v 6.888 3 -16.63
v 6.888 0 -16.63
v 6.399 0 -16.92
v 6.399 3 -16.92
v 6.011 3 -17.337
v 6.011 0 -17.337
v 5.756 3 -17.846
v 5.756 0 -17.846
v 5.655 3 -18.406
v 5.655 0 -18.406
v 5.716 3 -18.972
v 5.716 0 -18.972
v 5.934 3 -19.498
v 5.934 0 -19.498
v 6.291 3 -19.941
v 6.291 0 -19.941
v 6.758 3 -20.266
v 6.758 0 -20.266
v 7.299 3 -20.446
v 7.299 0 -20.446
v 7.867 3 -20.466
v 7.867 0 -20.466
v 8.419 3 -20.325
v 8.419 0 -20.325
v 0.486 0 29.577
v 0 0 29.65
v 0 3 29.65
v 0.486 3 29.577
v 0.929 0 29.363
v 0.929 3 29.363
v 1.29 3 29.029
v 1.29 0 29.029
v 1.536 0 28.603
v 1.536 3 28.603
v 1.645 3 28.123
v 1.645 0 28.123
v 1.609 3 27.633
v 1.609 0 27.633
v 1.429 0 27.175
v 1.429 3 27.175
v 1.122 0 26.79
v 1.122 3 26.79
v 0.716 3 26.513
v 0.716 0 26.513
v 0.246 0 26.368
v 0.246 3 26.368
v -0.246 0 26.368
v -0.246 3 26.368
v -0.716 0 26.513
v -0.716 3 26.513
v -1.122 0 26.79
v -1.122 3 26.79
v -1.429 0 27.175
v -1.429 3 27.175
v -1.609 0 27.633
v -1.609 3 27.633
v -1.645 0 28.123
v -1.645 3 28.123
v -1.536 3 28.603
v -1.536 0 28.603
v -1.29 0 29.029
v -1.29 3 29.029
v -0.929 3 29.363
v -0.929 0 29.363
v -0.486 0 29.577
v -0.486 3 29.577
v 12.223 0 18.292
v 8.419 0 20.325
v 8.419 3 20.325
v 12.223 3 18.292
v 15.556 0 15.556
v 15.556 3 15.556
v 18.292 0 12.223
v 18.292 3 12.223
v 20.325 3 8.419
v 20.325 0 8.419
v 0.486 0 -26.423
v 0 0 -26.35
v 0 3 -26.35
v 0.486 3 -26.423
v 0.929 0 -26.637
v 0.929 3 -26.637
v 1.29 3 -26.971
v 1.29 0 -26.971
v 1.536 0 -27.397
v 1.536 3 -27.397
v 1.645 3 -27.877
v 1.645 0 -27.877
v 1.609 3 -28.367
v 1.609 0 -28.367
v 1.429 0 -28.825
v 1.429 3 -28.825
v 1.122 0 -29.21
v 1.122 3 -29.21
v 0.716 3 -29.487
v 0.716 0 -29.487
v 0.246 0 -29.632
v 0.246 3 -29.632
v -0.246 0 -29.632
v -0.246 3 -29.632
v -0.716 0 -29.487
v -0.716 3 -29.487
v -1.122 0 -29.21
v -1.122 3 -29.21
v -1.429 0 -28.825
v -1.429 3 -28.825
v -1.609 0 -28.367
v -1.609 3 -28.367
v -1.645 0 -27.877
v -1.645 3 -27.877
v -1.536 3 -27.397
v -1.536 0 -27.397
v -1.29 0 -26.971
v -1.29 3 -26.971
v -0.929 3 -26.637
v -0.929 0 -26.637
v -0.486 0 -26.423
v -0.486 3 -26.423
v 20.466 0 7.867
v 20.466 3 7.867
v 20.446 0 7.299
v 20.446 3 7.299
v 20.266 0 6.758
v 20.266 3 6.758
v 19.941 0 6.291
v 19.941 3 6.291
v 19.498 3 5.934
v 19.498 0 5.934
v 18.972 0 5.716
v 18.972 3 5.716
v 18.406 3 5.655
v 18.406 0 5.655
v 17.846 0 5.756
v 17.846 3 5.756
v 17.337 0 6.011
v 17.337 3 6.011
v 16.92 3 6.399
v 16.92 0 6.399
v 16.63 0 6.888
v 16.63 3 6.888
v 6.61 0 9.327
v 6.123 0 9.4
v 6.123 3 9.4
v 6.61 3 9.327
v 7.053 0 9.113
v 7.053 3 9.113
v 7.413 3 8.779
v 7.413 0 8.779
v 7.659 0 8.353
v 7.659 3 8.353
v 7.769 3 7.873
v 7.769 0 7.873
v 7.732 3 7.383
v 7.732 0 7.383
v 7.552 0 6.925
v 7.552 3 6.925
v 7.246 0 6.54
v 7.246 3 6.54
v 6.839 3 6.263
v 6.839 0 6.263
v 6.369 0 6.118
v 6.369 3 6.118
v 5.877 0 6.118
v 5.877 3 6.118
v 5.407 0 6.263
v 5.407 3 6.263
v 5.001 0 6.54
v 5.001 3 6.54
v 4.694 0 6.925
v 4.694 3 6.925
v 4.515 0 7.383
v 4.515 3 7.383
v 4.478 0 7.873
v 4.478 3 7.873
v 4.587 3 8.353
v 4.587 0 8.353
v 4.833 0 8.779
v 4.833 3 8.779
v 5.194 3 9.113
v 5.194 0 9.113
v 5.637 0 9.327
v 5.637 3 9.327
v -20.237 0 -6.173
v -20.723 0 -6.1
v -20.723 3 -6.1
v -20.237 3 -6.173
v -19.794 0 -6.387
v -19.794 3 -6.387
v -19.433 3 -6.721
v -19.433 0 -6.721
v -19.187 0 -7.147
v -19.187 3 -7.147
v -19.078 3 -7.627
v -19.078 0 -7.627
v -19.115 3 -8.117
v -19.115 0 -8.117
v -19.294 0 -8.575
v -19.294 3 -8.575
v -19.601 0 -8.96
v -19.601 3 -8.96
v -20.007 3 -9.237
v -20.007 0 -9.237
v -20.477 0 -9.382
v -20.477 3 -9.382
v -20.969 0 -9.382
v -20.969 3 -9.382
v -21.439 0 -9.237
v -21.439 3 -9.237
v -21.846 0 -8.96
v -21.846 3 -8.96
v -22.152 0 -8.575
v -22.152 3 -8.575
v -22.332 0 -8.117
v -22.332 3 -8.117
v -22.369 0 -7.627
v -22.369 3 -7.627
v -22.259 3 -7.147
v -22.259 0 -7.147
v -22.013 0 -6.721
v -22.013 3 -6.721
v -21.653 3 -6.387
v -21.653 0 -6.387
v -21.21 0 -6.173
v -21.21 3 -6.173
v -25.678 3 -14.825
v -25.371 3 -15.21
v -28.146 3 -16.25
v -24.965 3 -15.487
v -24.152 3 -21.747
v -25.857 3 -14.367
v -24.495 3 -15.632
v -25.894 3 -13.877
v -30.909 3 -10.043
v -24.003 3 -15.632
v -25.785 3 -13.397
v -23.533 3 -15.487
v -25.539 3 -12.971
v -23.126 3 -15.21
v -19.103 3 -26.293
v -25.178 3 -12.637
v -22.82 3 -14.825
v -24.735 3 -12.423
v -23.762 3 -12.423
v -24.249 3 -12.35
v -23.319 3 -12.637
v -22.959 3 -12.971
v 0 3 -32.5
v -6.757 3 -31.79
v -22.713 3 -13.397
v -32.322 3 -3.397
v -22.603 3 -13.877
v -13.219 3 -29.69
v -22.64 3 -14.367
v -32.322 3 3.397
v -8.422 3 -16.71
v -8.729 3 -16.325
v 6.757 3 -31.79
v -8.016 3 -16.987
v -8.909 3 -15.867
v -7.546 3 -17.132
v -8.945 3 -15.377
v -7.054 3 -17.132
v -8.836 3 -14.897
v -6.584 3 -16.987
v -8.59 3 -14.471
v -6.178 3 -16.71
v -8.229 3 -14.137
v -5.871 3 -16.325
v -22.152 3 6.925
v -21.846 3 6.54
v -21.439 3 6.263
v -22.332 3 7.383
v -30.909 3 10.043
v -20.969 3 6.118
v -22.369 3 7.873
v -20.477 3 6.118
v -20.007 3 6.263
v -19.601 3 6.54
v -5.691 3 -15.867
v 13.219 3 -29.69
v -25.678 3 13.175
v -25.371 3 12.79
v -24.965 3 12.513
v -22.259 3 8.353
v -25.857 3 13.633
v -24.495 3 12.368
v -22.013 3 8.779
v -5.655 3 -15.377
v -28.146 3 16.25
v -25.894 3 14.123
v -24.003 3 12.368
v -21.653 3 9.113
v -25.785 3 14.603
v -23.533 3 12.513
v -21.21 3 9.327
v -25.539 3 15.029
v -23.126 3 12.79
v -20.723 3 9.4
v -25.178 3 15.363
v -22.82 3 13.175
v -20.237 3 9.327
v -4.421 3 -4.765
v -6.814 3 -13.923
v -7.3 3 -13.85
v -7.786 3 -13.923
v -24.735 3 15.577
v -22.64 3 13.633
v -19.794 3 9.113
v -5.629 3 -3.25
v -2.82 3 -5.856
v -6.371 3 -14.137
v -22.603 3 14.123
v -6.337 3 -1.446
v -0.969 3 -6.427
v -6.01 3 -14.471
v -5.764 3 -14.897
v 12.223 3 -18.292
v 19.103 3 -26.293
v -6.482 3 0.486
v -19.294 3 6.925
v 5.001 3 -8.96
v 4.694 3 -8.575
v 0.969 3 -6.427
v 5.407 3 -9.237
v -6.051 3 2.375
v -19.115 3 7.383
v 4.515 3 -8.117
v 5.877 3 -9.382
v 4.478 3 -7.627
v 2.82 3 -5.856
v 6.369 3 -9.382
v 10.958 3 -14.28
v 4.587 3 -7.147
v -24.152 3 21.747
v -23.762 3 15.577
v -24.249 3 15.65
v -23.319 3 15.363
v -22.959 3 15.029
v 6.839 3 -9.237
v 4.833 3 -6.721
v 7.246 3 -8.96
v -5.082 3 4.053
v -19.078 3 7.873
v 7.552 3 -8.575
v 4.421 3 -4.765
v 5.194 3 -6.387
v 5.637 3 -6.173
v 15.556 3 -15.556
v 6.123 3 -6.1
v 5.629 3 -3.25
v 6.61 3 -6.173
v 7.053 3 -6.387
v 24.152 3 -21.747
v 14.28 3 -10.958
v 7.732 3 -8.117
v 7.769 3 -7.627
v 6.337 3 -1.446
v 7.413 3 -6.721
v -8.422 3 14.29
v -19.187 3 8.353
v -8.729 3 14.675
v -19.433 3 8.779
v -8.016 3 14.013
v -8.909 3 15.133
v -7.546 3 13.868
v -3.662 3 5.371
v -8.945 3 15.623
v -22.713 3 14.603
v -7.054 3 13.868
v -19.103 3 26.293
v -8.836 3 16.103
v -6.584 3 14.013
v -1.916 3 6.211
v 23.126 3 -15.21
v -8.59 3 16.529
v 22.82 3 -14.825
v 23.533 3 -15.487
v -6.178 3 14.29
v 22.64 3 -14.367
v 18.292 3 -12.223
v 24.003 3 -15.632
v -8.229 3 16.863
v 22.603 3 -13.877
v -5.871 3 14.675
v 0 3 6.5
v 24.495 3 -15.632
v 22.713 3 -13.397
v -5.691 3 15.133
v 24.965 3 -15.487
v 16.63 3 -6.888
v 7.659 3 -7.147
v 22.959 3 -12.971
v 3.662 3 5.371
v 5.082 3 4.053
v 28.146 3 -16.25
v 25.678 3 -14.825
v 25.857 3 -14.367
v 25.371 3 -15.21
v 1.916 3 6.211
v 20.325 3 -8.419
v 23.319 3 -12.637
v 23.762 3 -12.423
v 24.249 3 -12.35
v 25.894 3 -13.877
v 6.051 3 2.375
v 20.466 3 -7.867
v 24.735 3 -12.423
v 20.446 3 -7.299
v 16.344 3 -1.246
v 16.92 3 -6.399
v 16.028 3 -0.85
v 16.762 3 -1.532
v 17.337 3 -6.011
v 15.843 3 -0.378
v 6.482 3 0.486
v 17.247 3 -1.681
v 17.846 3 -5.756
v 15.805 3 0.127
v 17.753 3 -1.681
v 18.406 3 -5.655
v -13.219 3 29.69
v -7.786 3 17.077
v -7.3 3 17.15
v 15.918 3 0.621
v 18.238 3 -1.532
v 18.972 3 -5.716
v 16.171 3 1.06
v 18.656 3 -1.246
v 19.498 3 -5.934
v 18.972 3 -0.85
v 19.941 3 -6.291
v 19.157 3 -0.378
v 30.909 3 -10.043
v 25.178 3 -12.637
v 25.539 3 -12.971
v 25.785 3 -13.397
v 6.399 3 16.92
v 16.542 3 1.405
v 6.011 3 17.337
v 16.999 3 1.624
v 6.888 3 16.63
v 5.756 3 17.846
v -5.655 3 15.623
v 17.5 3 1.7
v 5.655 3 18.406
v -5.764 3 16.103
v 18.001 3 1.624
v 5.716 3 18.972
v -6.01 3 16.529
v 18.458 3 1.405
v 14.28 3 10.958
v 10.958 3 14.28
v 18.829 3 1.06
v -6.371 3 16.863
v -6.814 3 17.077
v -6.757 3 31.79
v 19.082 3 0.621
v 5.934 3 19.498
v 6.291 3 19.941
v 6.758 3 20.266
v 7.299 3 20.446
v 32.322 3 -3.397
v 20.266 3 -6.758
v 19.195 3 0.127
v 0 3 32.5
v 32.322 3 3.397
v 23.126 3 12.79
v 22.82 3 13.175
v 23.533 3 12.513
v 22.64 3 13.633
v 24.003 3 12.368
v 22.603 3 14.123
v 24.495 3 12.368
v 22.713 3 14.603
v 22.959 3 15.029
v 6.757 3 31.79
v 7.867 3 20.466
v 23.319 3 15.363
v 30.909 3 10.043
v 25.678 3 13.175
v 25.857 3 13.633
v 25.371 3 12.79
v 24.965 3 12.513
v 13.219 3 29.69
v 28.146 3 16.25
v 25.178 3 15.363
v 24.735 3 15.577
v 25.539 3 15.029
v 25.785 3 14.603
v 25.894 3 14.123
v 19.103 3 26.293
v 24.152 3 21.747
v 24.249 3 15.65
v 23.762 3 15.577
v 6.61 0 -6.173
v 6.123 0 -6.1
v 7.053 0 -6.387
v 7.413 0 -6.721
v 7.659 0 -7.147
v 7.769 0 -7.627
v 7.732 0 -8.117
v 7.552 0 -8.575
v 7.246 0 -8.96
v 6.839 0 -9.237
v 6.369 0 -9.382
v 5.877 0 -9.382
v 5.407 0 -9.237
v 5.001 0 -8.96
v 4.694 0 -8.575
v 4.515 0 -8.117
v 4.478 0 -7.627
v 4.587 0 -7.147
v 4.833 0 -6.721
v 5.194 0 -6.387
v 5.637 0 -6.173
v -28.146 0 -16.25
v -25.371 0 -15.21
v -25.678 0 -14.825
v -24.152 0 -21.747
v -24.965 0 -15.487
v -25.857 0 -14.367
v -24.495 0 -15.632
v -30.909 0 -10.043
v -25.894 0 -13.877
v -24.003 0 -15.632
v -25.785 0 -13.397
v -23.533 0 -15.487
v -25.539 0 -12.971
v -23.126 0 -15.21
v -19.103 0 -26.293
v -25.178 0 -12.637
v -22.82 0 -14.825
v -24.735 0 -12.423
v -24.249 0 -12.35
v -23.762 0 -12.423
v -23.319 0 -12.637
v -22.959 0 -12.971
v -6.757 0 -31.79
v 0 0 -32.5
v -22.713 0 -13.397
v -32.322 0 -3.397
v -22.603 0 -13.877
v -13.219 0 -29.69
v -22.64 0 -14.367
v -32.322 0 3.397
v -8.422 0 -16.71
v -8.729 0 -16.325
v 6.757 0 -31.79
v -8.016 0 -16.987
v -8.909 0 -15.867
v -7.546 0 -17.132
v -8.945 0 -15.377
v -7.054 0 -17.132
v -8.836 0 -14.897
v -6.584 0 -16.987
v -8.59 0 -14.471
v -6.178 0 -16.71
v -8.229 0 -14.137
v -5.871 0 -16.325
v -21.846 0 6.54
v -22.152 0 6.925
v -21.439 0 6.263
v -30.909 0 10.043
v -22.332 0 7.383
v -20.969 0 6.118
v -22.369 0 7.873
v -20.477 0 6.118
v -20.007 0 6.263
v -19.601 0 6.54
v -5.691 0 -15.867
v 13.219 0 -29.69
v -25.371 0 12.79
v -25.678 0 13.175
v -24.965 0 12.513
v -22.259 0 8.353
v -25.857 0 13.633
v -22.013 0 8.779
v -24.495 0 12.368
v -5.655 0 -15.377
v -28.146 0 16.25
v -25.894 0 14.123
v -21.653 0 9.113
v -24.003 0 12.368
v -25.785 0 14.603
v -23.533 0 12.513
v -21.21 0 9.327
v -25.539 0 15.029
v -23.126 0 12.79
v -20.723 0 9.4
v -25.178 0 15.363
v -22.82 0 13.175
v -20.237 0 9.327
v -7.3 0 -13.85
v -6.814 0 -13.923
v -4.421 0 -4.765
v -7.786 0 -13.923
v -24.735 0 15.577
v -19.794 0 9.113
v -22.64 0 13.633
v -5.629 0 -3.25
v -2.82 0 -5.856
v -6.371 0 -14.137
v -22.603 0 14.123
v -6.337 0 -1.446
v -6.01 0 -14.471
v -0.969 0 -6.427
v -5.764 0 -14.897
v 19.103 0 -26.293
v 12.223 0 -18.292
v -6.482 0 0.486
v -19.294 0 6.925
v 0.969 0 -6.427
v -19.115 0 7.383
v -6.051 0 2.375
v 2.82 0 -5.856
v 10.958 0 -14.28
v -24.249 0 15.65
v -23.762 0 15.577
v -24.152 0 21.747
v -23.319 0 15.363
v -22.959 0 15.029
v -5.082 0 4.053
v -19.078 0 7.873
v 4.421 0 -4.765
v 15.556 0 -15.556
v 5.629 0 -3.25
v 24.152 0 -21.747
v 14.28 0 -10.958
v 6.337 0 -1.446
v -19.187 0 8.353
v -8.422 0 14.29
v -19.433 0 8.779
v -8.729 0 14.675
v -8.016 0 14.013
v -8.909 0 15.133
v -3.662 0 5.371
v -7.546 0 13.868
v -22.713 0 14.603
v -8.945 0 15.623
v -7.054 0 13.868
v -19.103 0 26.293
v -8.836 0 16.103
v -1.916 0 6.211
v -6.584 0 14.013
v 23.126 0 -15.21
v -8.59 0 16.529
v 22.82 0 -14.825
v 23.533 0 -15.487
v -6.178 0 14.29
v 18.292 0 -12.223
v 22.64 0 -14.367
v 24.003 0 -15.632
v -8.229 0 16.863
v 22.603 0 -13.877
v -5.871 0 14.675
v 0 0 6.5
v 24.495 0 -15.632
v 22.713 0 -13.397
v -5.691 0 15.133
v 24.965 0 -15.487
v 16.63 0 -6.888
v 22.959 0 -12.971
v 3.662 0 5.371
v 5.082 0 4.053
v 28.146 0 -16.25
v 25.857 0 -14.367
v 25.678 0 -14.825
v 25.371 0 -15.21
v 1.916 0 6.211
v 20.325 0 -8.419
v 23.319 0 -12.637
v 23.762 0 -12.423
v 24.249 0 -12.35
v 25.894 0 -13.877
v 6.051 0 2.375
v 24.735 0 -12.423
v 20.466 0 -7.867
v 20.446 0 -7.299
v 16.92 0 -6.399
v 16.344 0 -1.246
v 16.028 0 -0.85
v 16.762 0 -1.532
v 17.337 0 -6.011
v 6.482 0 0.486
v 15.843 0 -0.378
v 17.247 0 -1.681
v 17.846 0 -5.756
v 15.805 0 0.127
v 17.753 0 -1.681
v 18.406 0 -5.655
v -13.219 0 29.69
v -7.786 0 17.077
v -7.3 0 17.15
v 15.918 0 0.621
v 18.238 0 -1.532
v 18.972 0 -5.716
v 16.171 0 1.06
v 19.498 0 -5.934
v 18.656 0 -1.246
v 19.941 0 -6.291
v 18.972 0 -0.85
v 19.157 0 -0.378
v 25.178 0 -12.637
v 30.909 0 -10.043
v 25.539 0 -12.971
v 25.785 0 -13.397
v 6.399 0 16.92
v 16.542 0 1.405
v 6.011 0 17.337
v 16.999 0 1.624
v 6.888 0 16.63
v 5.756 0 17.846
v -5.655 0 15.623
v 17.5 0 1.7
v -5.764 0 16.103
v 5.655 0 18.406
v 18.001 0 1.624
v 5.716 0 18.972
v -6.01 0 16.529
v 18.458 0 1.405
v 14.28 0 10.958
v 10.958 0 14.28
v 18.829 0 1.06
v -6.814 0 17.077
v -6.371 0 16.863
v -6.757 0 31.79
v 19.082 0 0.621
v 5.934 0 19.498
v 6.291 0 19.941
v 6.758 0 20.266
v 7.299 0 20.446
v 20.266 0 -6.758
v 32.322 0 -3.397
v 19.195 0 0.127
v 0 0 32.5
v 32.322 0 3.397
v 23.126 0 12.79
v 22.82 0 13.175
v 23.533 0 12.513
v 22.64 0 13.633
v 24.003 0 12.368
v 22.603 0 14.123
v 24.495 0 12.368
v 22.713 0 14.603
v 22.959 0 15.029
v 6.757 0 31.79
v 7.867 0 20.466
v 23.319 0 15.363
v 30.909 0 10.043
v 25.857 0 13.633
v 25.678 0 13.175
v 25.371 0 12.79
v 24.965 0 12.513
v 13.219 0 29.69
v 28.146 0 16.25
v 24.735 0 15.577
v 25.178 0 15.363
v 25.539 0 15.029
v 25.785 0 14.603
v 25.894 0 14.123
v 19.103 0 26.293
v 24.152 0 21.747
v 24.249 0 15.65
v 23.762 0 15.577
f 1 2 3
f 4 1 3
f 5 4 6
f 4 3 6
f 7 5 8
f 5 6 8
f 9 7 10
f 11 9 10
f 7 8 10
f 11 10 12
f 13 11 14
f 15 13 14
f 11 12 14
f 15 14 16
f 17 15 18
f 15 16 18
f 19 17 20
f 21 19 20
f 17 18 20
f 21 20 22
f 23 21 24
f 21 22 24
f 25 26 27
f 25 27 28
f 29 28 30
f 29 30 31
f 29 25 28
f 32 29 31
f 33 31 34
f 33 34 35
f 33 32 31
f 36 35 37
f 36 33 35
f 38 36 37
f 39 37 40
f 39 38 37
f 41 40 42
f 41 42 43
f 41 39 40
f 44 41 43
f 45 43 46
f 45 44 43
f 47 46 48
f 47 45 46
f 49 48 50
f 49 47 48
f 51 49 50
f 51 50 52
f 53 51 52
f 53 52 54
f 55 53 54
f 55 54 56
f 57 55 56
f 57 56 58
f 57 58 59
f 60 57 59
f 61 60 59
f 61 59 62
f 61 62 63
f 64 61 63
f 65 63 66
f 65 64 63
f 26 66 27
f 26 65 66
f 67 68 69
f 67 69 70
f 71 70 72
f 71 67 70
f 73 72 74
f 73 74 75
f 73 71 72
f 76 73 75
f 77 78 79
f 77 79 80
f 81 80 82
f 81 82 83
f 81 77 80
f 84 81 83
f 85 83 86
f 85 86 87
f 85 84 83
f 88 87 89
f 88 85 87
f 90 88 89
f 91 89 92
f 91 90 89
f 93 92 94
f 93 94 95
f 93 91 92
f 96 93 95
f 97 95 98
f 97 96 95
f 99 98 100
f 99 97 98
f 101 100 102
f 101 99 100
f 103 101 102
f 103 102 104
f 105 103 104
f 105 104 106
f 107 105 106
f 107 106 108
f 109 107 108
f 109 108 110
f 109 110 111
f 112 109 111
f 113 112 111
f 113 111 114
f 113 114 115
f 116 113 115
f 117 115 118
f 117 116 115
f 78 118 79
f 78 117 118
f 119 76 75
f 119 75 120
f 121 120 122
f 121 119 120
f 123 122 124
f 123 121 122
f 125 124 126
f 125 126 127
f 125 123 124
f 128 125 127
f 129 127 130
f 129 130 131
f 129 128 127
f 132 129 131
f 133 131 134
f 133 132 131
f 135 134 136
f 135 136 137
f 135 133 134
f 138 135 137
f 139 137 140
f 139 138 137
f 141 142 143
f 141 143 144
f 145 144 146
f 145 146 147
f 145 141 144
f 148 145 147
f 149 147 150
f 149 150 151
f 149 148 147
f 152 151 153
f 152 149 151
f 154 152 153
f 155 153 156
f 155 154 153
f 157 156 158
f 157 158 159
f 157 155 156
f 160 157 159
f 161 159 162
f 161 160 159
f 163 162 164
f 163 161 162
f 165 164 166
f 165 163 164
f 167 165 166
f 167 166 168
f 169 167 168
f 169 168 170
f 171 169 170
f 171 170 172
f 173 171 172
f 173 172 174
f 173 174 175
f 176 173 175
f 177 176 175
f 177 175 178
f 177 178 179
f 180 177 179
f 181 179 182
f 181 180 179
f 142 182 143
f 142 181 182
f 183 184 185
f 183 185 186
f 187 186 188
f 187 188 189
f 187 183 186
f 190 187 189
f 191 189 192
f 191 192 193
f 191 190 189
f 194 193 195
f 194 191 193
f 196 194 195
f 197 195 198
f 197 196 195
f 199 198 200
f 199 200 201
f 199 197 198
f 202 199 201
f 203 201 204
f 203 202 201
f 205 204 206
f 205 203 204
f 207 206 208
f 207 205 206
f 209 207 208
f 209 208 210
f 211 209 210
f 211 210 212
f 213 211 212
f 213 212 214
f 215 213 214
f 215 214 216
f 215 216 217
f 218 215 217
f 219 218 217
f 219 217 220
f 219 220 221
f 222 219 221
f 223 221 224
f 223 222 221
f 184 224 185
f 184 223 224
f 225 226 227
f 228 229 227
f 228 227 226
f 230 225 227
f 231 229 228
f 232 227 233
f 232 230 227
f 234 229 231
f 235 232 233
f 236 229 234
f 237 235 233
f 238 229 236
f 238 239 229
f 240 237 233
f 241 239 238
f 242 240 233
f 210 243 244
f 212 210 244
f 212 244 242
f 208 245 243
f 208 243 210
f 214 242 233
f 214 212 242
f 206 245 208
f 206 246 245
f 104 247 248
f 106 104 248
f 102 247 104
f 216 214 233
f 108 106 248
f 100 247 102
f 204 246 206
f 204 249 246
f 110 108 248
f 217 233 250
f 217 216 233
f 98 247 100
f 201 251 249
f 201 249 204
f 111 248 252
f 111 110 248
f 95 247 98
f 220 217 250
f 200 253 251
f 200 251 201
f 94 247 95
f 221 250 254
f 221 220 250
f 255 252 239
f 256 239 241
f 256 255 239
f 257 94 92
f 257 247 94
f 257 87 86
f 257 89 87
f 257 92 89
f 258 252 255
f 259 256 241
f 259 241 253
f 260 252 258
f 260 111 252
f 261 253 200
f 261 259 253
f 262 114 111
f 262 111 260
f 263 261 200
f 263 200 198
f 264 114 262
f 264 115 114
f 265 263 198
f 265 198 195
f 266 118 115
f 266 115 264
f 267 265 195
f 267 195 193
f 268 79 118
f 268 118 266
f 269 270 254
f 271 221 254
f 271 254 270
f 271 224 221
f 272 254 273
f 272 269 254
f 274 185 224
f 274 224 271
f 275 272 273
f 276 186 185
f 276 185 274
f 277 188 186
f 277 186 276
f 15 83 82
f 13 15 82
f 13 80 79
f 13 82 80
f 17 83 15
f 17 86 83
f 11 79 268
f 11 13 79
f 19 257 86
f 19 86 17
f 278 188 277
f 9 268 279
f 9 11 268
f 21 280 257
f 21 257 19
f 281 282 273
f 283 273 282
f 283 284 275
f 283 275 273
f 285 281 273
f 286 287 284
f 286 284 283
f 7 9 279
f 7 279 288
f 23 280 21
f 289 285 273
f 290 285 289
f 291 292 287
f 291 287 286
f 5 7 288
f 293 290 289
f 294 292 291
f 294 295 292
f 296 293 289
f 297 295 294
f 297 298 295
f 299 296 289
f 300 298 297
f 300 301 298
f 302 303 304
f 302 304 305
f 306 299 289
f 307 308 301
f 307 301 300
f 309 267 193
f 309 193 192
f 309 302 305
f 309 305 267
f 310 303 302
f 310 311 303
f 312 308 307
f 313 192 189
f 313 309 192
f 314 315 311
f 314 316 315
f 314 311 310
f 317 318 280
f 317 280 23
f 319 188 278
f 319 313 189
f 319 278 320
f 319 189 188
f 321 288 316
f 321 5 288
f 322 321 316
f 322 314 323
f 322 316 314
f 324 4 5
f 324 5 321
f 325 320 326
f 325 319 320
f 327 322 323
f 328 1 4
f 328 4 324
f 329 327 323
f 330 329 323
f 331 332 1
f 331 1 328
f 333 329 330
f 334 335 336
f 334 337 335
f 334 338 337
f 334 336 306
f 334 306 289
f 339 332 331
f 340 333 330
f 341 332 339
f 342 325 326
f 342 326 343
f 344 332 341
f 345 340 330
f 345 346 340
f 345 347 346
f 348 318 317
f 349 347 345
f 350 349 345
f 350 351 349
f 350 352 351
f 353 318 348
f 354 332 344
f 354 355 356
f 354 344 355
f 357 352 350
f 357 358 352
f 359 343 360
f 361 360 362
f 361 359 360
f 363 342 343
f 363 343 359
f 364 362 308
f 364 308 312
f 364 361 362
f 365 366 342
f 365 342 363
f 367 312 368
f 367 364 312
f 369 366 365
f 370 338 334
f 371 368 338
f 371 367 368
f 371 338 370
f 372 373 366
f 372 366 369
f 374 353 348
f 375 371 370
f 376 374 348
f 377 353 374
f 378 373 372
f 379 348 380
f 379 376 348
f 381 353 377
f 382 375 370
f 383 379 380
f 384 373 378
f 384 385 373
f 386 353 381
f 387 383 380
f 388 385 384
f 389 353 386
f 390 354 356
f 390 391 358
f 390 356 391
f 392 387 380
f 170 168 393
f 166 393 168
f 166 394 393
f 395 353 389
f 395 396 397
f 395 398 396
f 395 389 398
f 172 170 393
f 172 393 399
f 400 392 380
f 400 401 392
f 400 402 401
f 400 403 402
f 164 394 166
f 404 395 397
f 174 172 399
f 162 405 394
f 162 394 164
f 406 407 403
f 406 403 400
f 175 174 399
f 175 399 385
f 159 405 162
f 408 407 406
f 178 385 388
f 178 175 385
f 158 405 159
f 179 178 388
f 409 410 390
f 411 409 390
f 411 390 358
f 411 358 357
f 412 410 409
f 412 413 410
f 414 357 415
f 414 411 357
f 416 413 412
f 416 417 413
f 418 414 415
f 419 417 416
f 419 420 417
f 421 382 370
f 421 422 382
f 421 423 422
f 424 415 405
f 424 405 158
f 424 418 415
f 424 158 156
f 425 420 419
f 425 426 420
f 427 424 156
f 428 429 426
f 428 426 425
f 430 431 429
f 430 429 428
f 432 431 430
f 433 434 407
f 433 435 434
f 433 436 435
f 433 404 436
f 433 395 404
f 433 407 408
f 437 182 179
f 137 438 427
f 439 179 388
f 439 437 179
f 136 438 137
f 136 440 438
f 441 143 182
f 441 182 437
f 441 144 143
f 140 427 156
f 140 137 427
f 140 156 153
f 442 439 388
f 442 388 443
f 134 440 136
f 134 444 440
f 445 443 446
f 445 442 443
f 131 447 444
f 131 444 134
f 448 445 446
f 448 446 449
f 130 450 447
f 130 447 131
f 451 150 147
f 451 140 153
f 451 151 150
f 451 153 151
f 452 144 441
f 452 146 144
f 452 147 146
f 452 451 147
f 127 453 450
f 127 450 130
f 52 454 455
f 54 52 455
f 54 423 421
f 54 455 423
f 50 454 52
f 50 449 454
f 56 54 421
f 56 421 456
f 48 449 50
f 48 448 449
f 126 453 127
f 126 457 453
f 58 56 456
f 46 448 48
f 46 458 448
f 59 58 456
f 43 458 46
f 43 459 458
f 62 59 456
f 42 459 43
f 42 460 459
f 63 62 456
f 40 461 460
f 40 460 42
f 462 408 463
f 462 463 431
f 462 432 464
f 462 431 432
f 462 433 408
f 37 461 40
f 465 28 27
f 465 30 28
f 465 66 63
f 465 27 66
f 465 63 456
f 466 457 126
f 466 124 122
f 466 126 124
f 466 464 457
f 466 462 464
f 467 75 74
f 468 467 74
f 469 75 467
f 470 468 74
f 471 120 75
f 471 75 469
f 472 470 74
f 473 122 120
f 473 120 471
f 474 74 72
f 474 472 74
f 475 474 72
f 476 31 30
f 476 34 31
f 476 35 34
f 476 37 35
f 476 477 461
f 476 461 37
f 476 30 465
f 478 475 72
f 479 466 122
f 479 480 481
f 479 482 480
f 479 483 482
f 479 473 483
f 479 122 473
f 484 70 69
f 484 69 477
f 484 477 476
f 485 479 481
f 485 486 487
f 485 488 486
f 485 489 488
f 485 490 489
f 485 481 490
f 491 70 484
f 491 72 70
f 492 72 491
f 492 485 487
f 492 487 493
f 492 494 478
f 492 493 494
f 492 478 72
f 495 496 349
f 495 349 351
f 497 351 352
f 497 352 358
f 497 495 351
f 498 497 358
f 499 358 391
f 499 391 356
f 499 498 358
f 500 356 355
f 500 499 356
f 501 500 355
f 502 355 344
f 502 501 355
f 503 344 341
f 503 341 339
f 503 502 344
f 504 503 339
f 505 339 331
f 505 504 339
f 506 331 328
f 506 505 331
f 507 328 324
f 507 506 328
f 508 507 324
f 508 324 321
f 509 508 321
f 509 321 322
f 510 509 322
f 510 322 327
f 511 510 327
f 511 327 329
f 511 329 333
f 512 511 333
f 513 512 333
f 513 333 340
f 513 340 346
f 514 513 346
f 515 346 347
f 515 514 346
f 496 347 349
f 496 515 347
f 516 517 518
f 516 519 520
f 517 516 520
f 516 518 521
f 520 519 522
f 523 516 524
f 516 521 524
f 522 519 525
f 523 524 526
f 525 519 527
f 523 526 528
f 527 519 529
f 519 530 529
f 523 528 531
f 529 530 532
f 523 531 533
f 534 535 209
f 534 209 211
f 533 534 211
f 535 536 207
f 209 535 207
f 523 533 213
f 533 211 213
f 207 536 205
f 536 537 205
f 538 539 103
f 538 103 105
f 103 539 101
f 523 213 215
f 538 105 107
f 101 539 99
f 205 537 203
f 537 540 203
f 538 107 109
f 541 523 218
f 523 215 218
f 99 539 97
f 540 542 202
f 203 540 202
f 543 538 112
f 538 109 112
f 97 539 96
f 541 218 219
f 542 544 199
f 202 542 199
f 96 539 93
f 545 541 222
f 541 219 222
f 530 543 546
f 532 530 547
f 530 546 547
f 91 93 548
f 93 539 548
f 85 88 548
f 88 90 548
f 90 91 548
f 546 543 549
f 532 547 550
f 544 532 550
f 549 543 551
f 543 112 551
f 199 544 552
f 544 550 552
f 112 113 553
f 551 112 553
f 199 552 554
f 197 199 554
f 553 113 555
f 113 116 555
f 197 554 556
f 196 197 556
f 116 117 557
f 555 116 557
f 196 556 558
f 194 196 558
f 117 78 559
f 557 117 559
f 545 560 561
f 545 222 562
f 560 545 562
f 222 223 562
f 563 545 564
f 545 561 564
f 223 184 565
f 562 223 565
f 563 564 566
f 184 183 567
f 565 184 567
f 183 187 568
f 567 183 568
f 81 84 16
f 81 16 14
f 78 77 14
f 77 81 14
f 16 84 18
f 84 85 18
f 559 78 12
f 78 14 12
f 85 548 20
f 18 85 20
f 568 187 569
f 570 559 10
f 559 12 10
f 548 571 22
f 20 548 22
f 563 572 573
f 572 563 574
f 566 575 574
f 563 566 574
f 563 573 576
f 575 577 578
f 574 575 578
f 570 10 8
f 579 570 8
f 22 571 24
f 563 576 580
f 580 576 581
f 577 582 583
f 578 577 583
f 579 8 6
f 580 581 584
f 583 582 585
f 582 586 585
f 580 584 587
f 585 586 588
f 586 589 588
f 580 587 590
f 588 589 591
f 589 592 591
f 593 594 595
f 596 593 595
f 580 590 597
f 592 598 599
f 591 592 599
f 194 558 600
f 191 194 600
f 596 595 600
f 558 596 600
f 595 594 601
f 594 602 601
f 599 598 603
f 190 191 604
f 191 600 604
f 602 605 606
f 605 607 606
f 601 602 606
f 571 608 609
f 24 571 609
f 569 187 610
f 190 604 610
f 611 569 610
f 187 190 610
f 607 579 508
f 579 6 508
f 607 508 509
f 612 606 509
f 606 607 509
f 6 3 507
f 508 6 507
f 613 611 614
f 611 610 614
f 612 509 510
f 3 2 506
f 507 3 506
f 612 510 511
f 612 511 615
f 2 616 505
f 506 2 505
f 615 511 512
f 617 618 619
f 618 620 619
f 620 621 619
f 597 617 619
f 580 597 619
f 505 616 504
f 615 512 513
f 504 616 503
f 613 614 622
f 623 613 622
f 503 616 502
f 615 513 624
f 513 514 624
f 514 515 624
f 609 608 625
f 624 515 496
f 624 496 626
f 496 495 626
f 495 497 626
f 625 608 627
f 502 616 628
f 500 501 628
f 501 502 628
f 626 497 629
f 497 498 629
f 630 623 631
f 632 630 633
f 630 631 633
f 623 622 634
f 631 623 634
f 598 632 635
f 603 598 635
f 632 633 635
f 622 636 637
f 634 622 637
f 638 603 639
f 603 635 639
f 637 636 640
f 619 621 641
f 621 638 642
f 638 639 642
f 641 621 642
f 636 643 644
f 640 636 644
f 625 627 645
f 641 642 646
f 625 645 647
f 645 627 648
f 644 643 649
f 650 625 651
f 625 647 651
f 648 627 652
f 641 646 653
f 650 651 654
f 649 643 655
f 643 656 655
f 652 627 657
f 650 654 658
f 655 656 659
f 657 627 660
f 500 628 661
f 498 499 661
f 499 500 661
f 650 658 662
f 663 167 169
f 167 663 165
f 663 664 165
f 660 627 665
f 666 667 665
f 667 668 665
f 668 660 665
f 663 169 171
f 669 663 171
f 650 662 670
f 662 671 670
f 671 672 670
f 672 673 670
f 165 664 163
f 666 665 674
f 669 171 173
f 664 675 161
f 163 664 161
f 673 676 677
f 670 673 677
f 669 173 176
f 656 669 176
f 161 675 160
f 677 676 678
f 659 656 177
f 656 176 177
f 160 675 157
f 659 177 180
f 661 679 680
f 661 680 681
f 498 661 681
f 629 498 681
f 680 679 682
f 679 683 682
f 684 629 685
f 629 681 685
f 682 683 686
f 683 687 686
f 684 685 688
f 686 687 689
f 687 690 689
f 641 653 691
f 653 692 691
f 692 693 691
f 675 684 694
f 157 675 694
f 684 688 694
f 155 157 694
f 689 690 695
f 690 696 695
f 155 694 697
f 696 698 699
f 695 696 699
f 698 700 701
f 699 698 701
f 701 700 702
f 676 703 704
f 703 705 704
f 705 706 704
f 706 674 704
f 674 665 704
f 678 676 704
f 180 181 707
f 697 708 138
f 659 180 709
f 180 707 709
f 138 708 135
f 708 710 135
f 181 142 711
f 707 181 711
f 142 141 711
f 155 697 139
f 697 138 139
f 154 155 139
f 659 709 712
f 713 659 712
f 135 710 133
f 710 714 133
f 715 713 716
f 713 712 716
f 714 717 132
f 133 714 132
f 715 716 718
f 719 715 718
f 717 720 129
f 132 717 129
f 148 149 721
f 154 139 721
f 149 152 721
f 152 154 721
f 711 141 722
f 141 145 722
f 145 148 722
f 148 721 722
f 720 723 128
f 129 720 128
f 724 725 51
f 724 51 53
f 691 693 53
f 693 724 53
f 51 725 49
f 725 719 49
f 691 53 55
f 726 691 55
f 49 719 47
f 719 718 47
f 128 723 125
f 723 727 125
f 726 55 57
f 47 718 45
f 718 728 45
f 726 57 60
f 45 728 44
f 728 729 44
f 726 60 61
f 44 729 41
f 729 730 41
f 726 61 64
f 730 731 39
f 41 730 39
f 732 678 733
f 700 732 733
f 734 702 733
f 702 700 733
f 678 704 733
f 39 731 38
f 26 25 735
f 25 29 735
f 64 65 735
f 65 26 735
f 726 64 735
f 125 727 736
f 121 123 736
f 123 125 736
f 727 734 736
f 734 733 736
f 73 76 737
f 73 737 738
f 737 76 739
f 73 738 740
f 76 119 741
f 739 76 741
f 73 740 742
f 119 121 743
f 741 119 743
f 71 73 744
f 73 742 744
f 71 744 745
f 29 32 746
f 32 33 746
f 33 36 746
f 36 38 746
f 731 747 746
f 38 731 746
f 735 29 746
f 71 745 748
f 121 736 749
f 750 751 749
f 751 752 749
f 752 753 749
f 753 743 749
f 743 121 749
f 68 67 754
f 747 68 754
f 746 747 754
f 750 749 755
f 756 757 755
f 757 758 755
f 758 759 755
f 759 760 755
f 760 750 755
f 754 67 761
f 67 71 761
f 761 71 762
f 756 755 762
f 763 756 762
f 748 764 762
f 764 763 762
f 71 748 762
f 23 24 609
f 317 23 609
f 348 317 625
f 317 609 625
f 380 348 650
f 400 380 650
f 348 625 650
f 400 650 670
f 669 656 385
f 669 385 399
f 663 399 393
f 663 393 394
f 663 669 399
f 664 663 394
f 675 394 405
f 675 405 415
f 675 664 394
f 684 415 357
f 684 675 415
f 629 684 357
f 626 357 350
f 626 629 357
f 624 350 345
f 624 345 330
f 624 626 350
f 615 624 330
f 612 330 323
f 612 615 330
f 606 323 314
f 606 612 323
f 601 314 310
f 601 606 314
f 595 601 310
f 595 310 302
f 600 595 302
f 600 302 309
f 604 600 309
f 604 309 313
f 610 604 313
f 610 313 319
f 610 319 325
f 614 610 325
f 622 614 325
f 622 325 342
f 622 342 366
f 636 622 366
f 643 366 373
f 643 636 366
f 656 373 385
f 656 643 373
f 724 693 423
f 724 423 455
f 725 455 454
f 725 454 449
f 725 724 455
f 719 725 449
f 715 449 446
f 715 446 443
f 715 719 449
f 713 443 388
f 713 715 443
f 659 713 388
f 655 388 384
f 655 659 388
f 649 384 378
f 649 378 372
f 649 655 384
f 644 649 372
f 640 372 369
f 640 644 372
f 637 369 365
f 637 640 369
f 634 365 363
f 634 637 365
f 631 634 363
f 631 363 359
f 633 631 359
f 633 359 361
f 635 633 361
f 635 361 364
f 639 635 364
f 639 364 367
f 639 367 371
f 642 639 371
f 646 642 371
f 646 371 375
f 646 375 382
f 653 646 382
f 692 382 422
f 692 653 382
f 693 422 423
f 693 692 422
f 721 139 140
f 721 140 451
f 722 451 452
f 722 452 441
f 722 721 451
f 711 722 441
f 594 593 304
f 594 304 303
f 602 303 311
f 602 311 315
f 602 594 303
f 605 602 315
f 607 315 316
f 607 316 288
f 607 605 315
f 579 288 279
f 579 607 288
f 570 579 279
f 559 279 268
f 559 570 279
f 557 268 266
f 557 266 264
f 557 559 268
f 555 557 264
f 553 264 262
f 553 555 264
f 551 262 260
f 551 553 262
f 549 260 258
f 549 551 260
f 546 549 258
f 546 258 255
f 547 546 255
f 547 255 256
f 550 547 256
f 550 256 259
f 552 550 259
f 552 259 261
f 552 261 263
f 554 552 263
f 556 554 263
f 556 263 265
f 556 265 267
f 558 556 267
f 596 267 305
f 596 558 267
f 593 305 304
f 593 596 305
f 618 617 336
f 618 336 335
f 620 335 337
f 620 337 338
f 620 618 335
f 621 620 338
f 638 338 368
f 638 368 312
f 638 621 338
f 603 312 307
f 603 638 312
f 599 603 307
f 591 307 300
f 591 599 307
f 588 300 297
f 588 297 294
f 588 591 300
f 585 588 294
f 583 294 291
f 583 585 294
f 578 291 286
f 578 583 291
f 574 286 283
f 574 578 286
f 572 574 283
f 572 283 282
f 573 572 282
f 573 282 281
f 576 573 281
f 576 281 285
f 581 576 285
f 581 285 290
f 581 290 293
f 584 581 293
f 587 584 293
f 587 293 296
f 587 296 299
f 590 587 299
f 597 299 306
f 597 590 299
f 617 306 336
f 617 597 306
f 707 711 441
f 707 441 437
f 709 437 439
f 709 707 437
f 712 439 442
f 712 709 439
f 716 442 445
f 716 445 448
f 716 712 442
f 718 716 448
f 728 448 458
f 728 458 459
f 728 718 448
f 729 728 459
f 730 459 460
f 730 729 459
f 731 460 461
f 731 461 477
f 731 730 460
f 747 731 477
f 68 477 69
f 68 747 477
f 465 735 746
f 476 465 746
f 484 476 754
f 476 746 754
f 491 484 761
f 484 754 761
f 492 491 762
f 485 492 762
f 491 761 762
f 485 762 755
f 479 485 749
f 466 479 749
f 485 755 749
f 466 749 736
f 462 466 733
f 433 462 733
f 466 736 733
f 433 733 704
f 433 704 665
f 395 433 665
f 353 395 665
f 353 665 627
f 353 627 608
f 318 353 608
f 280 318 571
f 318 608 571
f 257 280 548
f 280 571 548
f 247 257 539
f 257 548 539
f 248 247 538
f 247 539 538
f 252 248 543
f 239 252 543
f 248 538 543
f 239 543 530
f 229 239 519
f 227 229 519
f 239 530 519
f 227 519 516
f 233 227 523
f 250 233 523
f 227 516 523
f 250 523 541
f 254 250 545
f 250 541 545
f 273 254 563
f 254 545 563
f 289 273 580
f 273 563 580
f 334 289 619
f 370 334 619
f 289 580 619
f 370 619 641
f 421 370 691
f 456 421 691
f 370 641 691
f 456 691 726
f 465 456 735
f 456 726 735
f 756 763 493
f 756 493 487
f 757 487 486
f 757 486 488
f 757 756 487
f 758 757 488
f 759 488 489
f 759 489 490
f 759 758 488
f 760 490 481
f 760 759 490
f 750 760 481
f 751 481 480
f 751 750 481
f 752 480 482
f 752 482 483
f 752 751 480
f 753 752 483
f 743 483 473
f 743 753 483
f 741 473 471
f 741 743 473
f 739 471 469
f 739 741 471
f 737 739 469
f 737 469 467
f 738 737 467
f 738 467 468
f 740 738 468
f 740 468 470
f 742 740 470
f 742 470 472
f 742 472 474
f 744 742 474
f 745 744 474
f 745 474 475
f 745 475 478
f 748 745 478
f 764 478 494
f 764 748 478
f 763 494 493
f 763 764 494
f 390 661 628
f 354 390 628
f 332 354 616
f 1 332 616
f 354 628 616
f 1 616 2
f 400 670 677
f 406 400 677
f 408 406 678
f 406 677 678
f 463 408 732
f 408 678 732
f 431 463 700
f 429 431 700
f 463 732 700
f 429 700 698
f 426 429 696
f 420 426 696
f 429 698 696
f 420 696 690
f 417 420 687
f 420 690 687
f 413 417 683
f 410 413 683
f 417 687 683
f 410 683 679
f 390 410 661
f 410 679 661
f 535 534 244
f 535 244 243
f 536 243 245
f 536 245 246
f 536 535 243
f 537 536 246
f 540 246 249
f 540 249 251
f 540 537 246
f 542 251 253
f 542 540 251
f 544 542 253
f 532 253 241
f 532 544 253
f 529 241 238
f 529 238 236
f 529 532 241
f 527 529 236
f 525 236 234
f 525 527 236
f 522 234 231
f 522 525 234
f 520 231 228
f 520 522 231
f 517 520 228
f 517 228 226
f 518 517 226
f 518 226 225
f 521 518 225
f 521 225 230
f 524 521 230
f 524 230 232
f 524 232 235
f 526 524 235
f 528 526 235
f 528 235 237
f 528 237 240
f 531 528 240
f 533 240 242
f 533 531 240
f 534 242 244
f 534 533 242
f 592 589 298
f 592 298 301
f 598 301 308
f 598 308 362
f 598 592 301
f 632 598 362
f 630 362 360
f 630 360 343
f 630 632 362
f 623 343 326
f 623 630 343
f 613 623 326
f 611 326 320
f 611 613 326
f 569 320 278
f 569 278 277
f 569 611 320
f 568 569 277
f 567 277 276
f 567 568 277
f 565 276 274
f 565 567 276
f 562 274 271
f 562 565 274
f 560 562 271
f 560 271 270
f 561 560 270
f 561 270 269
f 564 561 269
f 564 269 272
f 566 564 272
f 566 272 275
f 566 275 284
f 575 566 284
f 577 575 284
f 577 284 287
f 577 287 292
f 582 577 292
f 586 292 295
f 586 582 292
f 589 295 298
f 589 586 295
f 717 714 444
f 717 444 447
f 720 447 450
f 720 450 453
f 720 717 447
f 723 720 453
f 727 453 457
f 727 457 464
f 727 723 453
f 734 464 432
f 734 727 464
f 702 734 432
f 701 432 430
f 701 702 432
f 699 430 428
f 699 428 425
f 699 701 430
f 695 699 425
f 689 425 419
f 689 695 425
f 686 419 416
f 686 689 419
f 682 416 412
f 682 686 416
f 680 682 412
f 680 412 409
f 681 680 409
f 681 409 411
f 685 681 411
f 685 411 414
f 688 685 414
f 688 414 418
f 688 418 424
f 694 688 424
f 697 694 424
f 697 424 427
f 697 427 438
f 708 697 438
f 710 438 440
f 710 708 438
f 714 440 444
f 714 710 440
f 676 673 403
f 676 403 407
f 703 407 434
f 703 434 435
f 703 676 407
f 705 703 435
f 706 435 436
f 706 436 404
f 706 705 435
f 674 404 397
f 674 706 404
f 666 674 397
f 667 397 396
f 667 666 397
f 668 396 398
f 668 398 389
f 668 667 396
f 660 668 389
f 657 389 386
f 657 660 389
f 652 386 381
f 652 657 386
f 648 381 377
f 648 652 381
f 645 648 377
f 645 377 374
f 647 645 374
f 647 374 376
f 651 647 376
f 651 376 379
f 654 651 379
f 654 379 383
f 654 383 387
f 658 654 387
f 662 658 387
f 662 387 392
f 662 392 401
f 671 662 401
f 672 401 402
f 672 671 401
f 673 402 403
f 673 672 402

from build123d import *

# Parameters (mm, degrees)
SKETCH_1_R      = 32.5
SKETCH_1_R_2    = 6.5
SKETCH_1_R_3    = 1.65
SKETCH_1_R_4    = 1.7
EXTRUDE_1_DEPTH = 3


with BuildPart() as part:
    # 草图1 → 凸台-拉伸1 (new body)
    with BuildSketch(Plane(origin=(0, 0, 0), x_dir=(1, 0, 0), z_dir=(0, 1, 0))):
        with Locations(Location((0, 0, 0), (0, 0, 270))):
            Circle(SKETCH_1_R)
        with Locations(Location((0, 0, 0), (0, 0, 270))):
            Circle(SKETCH_1_R_2, mode=Mode.SUBTRACT)
        with Locations(Location((-7.3, 15.5, 0), (0, 0, 270))):
            Circle(SKETCH_1_R_3, mode=Mode.SUBTRACT)
        with Locations(Location((6.123393759, 7.75, 0), (0, 0, 270))):
            Circle(SKETCH_1_R_3, mode=Mode.SUBTRACT)
        with Locations(Location((6.123393759, -7.75, 0), (0, 0, 270))):
            Circle(SKETCH_1_R_3, mode=Mode.SUBTRACT)
        with Locations(Location((-7.3, -15.5, 0), (0, 0, 270))):
            Circle(SKETCH_1_R_3, mode=Mode.SUBTRACT)
        with Locations(Location((-20.723393759, -7.75, 0), (0, 0, 270))):
            Circle(SKETCH_1_R_3, mode=Mode.SUBTRACT)
        with Locations(Location((-20.723393759, 7.75, 0), (0, 0, 270))):
            Circle(SKETCH_1_R_3, mode=Mode.SUBTRACT)
        with Locations(Location((17.5, 0, 0), (0, 0, 270))):
            Circle(SKETCH_1_R_4, mode=Mode.SUBTRACT)
        with Locations(Location((0, 28, 0), (0, 0, 270))):
            Circle(SKETCH_1_R_3, mode=Mode.SUBTRACT)
        with Locations(Location((24.248711306, 14, 0), (0, 0, 270))):
            Circle(SKETCH_1_R_3, mode=Mode.SUBTRACT)
        with Locations(Location((24.248711306, -14, 0), (0, 0, 270))):
            Circle(SKETCH_1_R_3, mode=Mode.SUBTRACT)
        with Locations(Location((0, -28, 0), (0, 0, 270))):
            Circle(SKETCH_1_R_3, mode=Mode.SUBTRACT)
        with Locations(Location((-24.248711306, -14, 0), (0, 0, 270))):
            Circle(SKETCH_1_R_3, mode=Mode.SUBTRACT)
        with Locations(Location((-24.248711306, 14, 0), (0, 0, 270))):
            Circle(SKETCH_1_R_3, mode=Mode.SUBTRACT)
        with BuildLine():
            ThreePointArc((8.419035512, -20.325349715), (15.556349186, -15.556349186), (20.325349715, -8.419035512))
            ThreePointArc((20.325349715, -8.419035512), (19.242957515, -5.805909582), (16.629831585, -6.888301783))
            ThreePointArc((16.629831585, -6.888301783), (12.727922061, -12.727922061), (6.888301783, -16.629831585))
            ThreePointArc((6.888301783, -16.629831585), (5.805909582, -19.242957515), (8.419035512, -20.325349715))
        make_face(mode=Mode.SUBTRACT)
        with BuildLine():
            ThreePointArc((8.419035512, 20.325349715), (15.556349186, 15.556349186), (20.325349715, 8.419035512))
            ThreePointArc((20.325349715, 8.419035512), (19.242957515, 5.805909582), (16.629831585, 6.888301783))
            ThreePointArc((16.629831585, 6.888301783), (12.727922061, 12.727922061), (6.888301783, 16.629831585))
            ThreePointArc((6.888301783, 16.629831585), (5.805909582, 19.242957515), (8.419035512, 20.325349715))
        make_face(mode=Mode.SUBTRACT)
    extrude(amount=EXTRUDE_1_DEPTH)


solid = part.part
